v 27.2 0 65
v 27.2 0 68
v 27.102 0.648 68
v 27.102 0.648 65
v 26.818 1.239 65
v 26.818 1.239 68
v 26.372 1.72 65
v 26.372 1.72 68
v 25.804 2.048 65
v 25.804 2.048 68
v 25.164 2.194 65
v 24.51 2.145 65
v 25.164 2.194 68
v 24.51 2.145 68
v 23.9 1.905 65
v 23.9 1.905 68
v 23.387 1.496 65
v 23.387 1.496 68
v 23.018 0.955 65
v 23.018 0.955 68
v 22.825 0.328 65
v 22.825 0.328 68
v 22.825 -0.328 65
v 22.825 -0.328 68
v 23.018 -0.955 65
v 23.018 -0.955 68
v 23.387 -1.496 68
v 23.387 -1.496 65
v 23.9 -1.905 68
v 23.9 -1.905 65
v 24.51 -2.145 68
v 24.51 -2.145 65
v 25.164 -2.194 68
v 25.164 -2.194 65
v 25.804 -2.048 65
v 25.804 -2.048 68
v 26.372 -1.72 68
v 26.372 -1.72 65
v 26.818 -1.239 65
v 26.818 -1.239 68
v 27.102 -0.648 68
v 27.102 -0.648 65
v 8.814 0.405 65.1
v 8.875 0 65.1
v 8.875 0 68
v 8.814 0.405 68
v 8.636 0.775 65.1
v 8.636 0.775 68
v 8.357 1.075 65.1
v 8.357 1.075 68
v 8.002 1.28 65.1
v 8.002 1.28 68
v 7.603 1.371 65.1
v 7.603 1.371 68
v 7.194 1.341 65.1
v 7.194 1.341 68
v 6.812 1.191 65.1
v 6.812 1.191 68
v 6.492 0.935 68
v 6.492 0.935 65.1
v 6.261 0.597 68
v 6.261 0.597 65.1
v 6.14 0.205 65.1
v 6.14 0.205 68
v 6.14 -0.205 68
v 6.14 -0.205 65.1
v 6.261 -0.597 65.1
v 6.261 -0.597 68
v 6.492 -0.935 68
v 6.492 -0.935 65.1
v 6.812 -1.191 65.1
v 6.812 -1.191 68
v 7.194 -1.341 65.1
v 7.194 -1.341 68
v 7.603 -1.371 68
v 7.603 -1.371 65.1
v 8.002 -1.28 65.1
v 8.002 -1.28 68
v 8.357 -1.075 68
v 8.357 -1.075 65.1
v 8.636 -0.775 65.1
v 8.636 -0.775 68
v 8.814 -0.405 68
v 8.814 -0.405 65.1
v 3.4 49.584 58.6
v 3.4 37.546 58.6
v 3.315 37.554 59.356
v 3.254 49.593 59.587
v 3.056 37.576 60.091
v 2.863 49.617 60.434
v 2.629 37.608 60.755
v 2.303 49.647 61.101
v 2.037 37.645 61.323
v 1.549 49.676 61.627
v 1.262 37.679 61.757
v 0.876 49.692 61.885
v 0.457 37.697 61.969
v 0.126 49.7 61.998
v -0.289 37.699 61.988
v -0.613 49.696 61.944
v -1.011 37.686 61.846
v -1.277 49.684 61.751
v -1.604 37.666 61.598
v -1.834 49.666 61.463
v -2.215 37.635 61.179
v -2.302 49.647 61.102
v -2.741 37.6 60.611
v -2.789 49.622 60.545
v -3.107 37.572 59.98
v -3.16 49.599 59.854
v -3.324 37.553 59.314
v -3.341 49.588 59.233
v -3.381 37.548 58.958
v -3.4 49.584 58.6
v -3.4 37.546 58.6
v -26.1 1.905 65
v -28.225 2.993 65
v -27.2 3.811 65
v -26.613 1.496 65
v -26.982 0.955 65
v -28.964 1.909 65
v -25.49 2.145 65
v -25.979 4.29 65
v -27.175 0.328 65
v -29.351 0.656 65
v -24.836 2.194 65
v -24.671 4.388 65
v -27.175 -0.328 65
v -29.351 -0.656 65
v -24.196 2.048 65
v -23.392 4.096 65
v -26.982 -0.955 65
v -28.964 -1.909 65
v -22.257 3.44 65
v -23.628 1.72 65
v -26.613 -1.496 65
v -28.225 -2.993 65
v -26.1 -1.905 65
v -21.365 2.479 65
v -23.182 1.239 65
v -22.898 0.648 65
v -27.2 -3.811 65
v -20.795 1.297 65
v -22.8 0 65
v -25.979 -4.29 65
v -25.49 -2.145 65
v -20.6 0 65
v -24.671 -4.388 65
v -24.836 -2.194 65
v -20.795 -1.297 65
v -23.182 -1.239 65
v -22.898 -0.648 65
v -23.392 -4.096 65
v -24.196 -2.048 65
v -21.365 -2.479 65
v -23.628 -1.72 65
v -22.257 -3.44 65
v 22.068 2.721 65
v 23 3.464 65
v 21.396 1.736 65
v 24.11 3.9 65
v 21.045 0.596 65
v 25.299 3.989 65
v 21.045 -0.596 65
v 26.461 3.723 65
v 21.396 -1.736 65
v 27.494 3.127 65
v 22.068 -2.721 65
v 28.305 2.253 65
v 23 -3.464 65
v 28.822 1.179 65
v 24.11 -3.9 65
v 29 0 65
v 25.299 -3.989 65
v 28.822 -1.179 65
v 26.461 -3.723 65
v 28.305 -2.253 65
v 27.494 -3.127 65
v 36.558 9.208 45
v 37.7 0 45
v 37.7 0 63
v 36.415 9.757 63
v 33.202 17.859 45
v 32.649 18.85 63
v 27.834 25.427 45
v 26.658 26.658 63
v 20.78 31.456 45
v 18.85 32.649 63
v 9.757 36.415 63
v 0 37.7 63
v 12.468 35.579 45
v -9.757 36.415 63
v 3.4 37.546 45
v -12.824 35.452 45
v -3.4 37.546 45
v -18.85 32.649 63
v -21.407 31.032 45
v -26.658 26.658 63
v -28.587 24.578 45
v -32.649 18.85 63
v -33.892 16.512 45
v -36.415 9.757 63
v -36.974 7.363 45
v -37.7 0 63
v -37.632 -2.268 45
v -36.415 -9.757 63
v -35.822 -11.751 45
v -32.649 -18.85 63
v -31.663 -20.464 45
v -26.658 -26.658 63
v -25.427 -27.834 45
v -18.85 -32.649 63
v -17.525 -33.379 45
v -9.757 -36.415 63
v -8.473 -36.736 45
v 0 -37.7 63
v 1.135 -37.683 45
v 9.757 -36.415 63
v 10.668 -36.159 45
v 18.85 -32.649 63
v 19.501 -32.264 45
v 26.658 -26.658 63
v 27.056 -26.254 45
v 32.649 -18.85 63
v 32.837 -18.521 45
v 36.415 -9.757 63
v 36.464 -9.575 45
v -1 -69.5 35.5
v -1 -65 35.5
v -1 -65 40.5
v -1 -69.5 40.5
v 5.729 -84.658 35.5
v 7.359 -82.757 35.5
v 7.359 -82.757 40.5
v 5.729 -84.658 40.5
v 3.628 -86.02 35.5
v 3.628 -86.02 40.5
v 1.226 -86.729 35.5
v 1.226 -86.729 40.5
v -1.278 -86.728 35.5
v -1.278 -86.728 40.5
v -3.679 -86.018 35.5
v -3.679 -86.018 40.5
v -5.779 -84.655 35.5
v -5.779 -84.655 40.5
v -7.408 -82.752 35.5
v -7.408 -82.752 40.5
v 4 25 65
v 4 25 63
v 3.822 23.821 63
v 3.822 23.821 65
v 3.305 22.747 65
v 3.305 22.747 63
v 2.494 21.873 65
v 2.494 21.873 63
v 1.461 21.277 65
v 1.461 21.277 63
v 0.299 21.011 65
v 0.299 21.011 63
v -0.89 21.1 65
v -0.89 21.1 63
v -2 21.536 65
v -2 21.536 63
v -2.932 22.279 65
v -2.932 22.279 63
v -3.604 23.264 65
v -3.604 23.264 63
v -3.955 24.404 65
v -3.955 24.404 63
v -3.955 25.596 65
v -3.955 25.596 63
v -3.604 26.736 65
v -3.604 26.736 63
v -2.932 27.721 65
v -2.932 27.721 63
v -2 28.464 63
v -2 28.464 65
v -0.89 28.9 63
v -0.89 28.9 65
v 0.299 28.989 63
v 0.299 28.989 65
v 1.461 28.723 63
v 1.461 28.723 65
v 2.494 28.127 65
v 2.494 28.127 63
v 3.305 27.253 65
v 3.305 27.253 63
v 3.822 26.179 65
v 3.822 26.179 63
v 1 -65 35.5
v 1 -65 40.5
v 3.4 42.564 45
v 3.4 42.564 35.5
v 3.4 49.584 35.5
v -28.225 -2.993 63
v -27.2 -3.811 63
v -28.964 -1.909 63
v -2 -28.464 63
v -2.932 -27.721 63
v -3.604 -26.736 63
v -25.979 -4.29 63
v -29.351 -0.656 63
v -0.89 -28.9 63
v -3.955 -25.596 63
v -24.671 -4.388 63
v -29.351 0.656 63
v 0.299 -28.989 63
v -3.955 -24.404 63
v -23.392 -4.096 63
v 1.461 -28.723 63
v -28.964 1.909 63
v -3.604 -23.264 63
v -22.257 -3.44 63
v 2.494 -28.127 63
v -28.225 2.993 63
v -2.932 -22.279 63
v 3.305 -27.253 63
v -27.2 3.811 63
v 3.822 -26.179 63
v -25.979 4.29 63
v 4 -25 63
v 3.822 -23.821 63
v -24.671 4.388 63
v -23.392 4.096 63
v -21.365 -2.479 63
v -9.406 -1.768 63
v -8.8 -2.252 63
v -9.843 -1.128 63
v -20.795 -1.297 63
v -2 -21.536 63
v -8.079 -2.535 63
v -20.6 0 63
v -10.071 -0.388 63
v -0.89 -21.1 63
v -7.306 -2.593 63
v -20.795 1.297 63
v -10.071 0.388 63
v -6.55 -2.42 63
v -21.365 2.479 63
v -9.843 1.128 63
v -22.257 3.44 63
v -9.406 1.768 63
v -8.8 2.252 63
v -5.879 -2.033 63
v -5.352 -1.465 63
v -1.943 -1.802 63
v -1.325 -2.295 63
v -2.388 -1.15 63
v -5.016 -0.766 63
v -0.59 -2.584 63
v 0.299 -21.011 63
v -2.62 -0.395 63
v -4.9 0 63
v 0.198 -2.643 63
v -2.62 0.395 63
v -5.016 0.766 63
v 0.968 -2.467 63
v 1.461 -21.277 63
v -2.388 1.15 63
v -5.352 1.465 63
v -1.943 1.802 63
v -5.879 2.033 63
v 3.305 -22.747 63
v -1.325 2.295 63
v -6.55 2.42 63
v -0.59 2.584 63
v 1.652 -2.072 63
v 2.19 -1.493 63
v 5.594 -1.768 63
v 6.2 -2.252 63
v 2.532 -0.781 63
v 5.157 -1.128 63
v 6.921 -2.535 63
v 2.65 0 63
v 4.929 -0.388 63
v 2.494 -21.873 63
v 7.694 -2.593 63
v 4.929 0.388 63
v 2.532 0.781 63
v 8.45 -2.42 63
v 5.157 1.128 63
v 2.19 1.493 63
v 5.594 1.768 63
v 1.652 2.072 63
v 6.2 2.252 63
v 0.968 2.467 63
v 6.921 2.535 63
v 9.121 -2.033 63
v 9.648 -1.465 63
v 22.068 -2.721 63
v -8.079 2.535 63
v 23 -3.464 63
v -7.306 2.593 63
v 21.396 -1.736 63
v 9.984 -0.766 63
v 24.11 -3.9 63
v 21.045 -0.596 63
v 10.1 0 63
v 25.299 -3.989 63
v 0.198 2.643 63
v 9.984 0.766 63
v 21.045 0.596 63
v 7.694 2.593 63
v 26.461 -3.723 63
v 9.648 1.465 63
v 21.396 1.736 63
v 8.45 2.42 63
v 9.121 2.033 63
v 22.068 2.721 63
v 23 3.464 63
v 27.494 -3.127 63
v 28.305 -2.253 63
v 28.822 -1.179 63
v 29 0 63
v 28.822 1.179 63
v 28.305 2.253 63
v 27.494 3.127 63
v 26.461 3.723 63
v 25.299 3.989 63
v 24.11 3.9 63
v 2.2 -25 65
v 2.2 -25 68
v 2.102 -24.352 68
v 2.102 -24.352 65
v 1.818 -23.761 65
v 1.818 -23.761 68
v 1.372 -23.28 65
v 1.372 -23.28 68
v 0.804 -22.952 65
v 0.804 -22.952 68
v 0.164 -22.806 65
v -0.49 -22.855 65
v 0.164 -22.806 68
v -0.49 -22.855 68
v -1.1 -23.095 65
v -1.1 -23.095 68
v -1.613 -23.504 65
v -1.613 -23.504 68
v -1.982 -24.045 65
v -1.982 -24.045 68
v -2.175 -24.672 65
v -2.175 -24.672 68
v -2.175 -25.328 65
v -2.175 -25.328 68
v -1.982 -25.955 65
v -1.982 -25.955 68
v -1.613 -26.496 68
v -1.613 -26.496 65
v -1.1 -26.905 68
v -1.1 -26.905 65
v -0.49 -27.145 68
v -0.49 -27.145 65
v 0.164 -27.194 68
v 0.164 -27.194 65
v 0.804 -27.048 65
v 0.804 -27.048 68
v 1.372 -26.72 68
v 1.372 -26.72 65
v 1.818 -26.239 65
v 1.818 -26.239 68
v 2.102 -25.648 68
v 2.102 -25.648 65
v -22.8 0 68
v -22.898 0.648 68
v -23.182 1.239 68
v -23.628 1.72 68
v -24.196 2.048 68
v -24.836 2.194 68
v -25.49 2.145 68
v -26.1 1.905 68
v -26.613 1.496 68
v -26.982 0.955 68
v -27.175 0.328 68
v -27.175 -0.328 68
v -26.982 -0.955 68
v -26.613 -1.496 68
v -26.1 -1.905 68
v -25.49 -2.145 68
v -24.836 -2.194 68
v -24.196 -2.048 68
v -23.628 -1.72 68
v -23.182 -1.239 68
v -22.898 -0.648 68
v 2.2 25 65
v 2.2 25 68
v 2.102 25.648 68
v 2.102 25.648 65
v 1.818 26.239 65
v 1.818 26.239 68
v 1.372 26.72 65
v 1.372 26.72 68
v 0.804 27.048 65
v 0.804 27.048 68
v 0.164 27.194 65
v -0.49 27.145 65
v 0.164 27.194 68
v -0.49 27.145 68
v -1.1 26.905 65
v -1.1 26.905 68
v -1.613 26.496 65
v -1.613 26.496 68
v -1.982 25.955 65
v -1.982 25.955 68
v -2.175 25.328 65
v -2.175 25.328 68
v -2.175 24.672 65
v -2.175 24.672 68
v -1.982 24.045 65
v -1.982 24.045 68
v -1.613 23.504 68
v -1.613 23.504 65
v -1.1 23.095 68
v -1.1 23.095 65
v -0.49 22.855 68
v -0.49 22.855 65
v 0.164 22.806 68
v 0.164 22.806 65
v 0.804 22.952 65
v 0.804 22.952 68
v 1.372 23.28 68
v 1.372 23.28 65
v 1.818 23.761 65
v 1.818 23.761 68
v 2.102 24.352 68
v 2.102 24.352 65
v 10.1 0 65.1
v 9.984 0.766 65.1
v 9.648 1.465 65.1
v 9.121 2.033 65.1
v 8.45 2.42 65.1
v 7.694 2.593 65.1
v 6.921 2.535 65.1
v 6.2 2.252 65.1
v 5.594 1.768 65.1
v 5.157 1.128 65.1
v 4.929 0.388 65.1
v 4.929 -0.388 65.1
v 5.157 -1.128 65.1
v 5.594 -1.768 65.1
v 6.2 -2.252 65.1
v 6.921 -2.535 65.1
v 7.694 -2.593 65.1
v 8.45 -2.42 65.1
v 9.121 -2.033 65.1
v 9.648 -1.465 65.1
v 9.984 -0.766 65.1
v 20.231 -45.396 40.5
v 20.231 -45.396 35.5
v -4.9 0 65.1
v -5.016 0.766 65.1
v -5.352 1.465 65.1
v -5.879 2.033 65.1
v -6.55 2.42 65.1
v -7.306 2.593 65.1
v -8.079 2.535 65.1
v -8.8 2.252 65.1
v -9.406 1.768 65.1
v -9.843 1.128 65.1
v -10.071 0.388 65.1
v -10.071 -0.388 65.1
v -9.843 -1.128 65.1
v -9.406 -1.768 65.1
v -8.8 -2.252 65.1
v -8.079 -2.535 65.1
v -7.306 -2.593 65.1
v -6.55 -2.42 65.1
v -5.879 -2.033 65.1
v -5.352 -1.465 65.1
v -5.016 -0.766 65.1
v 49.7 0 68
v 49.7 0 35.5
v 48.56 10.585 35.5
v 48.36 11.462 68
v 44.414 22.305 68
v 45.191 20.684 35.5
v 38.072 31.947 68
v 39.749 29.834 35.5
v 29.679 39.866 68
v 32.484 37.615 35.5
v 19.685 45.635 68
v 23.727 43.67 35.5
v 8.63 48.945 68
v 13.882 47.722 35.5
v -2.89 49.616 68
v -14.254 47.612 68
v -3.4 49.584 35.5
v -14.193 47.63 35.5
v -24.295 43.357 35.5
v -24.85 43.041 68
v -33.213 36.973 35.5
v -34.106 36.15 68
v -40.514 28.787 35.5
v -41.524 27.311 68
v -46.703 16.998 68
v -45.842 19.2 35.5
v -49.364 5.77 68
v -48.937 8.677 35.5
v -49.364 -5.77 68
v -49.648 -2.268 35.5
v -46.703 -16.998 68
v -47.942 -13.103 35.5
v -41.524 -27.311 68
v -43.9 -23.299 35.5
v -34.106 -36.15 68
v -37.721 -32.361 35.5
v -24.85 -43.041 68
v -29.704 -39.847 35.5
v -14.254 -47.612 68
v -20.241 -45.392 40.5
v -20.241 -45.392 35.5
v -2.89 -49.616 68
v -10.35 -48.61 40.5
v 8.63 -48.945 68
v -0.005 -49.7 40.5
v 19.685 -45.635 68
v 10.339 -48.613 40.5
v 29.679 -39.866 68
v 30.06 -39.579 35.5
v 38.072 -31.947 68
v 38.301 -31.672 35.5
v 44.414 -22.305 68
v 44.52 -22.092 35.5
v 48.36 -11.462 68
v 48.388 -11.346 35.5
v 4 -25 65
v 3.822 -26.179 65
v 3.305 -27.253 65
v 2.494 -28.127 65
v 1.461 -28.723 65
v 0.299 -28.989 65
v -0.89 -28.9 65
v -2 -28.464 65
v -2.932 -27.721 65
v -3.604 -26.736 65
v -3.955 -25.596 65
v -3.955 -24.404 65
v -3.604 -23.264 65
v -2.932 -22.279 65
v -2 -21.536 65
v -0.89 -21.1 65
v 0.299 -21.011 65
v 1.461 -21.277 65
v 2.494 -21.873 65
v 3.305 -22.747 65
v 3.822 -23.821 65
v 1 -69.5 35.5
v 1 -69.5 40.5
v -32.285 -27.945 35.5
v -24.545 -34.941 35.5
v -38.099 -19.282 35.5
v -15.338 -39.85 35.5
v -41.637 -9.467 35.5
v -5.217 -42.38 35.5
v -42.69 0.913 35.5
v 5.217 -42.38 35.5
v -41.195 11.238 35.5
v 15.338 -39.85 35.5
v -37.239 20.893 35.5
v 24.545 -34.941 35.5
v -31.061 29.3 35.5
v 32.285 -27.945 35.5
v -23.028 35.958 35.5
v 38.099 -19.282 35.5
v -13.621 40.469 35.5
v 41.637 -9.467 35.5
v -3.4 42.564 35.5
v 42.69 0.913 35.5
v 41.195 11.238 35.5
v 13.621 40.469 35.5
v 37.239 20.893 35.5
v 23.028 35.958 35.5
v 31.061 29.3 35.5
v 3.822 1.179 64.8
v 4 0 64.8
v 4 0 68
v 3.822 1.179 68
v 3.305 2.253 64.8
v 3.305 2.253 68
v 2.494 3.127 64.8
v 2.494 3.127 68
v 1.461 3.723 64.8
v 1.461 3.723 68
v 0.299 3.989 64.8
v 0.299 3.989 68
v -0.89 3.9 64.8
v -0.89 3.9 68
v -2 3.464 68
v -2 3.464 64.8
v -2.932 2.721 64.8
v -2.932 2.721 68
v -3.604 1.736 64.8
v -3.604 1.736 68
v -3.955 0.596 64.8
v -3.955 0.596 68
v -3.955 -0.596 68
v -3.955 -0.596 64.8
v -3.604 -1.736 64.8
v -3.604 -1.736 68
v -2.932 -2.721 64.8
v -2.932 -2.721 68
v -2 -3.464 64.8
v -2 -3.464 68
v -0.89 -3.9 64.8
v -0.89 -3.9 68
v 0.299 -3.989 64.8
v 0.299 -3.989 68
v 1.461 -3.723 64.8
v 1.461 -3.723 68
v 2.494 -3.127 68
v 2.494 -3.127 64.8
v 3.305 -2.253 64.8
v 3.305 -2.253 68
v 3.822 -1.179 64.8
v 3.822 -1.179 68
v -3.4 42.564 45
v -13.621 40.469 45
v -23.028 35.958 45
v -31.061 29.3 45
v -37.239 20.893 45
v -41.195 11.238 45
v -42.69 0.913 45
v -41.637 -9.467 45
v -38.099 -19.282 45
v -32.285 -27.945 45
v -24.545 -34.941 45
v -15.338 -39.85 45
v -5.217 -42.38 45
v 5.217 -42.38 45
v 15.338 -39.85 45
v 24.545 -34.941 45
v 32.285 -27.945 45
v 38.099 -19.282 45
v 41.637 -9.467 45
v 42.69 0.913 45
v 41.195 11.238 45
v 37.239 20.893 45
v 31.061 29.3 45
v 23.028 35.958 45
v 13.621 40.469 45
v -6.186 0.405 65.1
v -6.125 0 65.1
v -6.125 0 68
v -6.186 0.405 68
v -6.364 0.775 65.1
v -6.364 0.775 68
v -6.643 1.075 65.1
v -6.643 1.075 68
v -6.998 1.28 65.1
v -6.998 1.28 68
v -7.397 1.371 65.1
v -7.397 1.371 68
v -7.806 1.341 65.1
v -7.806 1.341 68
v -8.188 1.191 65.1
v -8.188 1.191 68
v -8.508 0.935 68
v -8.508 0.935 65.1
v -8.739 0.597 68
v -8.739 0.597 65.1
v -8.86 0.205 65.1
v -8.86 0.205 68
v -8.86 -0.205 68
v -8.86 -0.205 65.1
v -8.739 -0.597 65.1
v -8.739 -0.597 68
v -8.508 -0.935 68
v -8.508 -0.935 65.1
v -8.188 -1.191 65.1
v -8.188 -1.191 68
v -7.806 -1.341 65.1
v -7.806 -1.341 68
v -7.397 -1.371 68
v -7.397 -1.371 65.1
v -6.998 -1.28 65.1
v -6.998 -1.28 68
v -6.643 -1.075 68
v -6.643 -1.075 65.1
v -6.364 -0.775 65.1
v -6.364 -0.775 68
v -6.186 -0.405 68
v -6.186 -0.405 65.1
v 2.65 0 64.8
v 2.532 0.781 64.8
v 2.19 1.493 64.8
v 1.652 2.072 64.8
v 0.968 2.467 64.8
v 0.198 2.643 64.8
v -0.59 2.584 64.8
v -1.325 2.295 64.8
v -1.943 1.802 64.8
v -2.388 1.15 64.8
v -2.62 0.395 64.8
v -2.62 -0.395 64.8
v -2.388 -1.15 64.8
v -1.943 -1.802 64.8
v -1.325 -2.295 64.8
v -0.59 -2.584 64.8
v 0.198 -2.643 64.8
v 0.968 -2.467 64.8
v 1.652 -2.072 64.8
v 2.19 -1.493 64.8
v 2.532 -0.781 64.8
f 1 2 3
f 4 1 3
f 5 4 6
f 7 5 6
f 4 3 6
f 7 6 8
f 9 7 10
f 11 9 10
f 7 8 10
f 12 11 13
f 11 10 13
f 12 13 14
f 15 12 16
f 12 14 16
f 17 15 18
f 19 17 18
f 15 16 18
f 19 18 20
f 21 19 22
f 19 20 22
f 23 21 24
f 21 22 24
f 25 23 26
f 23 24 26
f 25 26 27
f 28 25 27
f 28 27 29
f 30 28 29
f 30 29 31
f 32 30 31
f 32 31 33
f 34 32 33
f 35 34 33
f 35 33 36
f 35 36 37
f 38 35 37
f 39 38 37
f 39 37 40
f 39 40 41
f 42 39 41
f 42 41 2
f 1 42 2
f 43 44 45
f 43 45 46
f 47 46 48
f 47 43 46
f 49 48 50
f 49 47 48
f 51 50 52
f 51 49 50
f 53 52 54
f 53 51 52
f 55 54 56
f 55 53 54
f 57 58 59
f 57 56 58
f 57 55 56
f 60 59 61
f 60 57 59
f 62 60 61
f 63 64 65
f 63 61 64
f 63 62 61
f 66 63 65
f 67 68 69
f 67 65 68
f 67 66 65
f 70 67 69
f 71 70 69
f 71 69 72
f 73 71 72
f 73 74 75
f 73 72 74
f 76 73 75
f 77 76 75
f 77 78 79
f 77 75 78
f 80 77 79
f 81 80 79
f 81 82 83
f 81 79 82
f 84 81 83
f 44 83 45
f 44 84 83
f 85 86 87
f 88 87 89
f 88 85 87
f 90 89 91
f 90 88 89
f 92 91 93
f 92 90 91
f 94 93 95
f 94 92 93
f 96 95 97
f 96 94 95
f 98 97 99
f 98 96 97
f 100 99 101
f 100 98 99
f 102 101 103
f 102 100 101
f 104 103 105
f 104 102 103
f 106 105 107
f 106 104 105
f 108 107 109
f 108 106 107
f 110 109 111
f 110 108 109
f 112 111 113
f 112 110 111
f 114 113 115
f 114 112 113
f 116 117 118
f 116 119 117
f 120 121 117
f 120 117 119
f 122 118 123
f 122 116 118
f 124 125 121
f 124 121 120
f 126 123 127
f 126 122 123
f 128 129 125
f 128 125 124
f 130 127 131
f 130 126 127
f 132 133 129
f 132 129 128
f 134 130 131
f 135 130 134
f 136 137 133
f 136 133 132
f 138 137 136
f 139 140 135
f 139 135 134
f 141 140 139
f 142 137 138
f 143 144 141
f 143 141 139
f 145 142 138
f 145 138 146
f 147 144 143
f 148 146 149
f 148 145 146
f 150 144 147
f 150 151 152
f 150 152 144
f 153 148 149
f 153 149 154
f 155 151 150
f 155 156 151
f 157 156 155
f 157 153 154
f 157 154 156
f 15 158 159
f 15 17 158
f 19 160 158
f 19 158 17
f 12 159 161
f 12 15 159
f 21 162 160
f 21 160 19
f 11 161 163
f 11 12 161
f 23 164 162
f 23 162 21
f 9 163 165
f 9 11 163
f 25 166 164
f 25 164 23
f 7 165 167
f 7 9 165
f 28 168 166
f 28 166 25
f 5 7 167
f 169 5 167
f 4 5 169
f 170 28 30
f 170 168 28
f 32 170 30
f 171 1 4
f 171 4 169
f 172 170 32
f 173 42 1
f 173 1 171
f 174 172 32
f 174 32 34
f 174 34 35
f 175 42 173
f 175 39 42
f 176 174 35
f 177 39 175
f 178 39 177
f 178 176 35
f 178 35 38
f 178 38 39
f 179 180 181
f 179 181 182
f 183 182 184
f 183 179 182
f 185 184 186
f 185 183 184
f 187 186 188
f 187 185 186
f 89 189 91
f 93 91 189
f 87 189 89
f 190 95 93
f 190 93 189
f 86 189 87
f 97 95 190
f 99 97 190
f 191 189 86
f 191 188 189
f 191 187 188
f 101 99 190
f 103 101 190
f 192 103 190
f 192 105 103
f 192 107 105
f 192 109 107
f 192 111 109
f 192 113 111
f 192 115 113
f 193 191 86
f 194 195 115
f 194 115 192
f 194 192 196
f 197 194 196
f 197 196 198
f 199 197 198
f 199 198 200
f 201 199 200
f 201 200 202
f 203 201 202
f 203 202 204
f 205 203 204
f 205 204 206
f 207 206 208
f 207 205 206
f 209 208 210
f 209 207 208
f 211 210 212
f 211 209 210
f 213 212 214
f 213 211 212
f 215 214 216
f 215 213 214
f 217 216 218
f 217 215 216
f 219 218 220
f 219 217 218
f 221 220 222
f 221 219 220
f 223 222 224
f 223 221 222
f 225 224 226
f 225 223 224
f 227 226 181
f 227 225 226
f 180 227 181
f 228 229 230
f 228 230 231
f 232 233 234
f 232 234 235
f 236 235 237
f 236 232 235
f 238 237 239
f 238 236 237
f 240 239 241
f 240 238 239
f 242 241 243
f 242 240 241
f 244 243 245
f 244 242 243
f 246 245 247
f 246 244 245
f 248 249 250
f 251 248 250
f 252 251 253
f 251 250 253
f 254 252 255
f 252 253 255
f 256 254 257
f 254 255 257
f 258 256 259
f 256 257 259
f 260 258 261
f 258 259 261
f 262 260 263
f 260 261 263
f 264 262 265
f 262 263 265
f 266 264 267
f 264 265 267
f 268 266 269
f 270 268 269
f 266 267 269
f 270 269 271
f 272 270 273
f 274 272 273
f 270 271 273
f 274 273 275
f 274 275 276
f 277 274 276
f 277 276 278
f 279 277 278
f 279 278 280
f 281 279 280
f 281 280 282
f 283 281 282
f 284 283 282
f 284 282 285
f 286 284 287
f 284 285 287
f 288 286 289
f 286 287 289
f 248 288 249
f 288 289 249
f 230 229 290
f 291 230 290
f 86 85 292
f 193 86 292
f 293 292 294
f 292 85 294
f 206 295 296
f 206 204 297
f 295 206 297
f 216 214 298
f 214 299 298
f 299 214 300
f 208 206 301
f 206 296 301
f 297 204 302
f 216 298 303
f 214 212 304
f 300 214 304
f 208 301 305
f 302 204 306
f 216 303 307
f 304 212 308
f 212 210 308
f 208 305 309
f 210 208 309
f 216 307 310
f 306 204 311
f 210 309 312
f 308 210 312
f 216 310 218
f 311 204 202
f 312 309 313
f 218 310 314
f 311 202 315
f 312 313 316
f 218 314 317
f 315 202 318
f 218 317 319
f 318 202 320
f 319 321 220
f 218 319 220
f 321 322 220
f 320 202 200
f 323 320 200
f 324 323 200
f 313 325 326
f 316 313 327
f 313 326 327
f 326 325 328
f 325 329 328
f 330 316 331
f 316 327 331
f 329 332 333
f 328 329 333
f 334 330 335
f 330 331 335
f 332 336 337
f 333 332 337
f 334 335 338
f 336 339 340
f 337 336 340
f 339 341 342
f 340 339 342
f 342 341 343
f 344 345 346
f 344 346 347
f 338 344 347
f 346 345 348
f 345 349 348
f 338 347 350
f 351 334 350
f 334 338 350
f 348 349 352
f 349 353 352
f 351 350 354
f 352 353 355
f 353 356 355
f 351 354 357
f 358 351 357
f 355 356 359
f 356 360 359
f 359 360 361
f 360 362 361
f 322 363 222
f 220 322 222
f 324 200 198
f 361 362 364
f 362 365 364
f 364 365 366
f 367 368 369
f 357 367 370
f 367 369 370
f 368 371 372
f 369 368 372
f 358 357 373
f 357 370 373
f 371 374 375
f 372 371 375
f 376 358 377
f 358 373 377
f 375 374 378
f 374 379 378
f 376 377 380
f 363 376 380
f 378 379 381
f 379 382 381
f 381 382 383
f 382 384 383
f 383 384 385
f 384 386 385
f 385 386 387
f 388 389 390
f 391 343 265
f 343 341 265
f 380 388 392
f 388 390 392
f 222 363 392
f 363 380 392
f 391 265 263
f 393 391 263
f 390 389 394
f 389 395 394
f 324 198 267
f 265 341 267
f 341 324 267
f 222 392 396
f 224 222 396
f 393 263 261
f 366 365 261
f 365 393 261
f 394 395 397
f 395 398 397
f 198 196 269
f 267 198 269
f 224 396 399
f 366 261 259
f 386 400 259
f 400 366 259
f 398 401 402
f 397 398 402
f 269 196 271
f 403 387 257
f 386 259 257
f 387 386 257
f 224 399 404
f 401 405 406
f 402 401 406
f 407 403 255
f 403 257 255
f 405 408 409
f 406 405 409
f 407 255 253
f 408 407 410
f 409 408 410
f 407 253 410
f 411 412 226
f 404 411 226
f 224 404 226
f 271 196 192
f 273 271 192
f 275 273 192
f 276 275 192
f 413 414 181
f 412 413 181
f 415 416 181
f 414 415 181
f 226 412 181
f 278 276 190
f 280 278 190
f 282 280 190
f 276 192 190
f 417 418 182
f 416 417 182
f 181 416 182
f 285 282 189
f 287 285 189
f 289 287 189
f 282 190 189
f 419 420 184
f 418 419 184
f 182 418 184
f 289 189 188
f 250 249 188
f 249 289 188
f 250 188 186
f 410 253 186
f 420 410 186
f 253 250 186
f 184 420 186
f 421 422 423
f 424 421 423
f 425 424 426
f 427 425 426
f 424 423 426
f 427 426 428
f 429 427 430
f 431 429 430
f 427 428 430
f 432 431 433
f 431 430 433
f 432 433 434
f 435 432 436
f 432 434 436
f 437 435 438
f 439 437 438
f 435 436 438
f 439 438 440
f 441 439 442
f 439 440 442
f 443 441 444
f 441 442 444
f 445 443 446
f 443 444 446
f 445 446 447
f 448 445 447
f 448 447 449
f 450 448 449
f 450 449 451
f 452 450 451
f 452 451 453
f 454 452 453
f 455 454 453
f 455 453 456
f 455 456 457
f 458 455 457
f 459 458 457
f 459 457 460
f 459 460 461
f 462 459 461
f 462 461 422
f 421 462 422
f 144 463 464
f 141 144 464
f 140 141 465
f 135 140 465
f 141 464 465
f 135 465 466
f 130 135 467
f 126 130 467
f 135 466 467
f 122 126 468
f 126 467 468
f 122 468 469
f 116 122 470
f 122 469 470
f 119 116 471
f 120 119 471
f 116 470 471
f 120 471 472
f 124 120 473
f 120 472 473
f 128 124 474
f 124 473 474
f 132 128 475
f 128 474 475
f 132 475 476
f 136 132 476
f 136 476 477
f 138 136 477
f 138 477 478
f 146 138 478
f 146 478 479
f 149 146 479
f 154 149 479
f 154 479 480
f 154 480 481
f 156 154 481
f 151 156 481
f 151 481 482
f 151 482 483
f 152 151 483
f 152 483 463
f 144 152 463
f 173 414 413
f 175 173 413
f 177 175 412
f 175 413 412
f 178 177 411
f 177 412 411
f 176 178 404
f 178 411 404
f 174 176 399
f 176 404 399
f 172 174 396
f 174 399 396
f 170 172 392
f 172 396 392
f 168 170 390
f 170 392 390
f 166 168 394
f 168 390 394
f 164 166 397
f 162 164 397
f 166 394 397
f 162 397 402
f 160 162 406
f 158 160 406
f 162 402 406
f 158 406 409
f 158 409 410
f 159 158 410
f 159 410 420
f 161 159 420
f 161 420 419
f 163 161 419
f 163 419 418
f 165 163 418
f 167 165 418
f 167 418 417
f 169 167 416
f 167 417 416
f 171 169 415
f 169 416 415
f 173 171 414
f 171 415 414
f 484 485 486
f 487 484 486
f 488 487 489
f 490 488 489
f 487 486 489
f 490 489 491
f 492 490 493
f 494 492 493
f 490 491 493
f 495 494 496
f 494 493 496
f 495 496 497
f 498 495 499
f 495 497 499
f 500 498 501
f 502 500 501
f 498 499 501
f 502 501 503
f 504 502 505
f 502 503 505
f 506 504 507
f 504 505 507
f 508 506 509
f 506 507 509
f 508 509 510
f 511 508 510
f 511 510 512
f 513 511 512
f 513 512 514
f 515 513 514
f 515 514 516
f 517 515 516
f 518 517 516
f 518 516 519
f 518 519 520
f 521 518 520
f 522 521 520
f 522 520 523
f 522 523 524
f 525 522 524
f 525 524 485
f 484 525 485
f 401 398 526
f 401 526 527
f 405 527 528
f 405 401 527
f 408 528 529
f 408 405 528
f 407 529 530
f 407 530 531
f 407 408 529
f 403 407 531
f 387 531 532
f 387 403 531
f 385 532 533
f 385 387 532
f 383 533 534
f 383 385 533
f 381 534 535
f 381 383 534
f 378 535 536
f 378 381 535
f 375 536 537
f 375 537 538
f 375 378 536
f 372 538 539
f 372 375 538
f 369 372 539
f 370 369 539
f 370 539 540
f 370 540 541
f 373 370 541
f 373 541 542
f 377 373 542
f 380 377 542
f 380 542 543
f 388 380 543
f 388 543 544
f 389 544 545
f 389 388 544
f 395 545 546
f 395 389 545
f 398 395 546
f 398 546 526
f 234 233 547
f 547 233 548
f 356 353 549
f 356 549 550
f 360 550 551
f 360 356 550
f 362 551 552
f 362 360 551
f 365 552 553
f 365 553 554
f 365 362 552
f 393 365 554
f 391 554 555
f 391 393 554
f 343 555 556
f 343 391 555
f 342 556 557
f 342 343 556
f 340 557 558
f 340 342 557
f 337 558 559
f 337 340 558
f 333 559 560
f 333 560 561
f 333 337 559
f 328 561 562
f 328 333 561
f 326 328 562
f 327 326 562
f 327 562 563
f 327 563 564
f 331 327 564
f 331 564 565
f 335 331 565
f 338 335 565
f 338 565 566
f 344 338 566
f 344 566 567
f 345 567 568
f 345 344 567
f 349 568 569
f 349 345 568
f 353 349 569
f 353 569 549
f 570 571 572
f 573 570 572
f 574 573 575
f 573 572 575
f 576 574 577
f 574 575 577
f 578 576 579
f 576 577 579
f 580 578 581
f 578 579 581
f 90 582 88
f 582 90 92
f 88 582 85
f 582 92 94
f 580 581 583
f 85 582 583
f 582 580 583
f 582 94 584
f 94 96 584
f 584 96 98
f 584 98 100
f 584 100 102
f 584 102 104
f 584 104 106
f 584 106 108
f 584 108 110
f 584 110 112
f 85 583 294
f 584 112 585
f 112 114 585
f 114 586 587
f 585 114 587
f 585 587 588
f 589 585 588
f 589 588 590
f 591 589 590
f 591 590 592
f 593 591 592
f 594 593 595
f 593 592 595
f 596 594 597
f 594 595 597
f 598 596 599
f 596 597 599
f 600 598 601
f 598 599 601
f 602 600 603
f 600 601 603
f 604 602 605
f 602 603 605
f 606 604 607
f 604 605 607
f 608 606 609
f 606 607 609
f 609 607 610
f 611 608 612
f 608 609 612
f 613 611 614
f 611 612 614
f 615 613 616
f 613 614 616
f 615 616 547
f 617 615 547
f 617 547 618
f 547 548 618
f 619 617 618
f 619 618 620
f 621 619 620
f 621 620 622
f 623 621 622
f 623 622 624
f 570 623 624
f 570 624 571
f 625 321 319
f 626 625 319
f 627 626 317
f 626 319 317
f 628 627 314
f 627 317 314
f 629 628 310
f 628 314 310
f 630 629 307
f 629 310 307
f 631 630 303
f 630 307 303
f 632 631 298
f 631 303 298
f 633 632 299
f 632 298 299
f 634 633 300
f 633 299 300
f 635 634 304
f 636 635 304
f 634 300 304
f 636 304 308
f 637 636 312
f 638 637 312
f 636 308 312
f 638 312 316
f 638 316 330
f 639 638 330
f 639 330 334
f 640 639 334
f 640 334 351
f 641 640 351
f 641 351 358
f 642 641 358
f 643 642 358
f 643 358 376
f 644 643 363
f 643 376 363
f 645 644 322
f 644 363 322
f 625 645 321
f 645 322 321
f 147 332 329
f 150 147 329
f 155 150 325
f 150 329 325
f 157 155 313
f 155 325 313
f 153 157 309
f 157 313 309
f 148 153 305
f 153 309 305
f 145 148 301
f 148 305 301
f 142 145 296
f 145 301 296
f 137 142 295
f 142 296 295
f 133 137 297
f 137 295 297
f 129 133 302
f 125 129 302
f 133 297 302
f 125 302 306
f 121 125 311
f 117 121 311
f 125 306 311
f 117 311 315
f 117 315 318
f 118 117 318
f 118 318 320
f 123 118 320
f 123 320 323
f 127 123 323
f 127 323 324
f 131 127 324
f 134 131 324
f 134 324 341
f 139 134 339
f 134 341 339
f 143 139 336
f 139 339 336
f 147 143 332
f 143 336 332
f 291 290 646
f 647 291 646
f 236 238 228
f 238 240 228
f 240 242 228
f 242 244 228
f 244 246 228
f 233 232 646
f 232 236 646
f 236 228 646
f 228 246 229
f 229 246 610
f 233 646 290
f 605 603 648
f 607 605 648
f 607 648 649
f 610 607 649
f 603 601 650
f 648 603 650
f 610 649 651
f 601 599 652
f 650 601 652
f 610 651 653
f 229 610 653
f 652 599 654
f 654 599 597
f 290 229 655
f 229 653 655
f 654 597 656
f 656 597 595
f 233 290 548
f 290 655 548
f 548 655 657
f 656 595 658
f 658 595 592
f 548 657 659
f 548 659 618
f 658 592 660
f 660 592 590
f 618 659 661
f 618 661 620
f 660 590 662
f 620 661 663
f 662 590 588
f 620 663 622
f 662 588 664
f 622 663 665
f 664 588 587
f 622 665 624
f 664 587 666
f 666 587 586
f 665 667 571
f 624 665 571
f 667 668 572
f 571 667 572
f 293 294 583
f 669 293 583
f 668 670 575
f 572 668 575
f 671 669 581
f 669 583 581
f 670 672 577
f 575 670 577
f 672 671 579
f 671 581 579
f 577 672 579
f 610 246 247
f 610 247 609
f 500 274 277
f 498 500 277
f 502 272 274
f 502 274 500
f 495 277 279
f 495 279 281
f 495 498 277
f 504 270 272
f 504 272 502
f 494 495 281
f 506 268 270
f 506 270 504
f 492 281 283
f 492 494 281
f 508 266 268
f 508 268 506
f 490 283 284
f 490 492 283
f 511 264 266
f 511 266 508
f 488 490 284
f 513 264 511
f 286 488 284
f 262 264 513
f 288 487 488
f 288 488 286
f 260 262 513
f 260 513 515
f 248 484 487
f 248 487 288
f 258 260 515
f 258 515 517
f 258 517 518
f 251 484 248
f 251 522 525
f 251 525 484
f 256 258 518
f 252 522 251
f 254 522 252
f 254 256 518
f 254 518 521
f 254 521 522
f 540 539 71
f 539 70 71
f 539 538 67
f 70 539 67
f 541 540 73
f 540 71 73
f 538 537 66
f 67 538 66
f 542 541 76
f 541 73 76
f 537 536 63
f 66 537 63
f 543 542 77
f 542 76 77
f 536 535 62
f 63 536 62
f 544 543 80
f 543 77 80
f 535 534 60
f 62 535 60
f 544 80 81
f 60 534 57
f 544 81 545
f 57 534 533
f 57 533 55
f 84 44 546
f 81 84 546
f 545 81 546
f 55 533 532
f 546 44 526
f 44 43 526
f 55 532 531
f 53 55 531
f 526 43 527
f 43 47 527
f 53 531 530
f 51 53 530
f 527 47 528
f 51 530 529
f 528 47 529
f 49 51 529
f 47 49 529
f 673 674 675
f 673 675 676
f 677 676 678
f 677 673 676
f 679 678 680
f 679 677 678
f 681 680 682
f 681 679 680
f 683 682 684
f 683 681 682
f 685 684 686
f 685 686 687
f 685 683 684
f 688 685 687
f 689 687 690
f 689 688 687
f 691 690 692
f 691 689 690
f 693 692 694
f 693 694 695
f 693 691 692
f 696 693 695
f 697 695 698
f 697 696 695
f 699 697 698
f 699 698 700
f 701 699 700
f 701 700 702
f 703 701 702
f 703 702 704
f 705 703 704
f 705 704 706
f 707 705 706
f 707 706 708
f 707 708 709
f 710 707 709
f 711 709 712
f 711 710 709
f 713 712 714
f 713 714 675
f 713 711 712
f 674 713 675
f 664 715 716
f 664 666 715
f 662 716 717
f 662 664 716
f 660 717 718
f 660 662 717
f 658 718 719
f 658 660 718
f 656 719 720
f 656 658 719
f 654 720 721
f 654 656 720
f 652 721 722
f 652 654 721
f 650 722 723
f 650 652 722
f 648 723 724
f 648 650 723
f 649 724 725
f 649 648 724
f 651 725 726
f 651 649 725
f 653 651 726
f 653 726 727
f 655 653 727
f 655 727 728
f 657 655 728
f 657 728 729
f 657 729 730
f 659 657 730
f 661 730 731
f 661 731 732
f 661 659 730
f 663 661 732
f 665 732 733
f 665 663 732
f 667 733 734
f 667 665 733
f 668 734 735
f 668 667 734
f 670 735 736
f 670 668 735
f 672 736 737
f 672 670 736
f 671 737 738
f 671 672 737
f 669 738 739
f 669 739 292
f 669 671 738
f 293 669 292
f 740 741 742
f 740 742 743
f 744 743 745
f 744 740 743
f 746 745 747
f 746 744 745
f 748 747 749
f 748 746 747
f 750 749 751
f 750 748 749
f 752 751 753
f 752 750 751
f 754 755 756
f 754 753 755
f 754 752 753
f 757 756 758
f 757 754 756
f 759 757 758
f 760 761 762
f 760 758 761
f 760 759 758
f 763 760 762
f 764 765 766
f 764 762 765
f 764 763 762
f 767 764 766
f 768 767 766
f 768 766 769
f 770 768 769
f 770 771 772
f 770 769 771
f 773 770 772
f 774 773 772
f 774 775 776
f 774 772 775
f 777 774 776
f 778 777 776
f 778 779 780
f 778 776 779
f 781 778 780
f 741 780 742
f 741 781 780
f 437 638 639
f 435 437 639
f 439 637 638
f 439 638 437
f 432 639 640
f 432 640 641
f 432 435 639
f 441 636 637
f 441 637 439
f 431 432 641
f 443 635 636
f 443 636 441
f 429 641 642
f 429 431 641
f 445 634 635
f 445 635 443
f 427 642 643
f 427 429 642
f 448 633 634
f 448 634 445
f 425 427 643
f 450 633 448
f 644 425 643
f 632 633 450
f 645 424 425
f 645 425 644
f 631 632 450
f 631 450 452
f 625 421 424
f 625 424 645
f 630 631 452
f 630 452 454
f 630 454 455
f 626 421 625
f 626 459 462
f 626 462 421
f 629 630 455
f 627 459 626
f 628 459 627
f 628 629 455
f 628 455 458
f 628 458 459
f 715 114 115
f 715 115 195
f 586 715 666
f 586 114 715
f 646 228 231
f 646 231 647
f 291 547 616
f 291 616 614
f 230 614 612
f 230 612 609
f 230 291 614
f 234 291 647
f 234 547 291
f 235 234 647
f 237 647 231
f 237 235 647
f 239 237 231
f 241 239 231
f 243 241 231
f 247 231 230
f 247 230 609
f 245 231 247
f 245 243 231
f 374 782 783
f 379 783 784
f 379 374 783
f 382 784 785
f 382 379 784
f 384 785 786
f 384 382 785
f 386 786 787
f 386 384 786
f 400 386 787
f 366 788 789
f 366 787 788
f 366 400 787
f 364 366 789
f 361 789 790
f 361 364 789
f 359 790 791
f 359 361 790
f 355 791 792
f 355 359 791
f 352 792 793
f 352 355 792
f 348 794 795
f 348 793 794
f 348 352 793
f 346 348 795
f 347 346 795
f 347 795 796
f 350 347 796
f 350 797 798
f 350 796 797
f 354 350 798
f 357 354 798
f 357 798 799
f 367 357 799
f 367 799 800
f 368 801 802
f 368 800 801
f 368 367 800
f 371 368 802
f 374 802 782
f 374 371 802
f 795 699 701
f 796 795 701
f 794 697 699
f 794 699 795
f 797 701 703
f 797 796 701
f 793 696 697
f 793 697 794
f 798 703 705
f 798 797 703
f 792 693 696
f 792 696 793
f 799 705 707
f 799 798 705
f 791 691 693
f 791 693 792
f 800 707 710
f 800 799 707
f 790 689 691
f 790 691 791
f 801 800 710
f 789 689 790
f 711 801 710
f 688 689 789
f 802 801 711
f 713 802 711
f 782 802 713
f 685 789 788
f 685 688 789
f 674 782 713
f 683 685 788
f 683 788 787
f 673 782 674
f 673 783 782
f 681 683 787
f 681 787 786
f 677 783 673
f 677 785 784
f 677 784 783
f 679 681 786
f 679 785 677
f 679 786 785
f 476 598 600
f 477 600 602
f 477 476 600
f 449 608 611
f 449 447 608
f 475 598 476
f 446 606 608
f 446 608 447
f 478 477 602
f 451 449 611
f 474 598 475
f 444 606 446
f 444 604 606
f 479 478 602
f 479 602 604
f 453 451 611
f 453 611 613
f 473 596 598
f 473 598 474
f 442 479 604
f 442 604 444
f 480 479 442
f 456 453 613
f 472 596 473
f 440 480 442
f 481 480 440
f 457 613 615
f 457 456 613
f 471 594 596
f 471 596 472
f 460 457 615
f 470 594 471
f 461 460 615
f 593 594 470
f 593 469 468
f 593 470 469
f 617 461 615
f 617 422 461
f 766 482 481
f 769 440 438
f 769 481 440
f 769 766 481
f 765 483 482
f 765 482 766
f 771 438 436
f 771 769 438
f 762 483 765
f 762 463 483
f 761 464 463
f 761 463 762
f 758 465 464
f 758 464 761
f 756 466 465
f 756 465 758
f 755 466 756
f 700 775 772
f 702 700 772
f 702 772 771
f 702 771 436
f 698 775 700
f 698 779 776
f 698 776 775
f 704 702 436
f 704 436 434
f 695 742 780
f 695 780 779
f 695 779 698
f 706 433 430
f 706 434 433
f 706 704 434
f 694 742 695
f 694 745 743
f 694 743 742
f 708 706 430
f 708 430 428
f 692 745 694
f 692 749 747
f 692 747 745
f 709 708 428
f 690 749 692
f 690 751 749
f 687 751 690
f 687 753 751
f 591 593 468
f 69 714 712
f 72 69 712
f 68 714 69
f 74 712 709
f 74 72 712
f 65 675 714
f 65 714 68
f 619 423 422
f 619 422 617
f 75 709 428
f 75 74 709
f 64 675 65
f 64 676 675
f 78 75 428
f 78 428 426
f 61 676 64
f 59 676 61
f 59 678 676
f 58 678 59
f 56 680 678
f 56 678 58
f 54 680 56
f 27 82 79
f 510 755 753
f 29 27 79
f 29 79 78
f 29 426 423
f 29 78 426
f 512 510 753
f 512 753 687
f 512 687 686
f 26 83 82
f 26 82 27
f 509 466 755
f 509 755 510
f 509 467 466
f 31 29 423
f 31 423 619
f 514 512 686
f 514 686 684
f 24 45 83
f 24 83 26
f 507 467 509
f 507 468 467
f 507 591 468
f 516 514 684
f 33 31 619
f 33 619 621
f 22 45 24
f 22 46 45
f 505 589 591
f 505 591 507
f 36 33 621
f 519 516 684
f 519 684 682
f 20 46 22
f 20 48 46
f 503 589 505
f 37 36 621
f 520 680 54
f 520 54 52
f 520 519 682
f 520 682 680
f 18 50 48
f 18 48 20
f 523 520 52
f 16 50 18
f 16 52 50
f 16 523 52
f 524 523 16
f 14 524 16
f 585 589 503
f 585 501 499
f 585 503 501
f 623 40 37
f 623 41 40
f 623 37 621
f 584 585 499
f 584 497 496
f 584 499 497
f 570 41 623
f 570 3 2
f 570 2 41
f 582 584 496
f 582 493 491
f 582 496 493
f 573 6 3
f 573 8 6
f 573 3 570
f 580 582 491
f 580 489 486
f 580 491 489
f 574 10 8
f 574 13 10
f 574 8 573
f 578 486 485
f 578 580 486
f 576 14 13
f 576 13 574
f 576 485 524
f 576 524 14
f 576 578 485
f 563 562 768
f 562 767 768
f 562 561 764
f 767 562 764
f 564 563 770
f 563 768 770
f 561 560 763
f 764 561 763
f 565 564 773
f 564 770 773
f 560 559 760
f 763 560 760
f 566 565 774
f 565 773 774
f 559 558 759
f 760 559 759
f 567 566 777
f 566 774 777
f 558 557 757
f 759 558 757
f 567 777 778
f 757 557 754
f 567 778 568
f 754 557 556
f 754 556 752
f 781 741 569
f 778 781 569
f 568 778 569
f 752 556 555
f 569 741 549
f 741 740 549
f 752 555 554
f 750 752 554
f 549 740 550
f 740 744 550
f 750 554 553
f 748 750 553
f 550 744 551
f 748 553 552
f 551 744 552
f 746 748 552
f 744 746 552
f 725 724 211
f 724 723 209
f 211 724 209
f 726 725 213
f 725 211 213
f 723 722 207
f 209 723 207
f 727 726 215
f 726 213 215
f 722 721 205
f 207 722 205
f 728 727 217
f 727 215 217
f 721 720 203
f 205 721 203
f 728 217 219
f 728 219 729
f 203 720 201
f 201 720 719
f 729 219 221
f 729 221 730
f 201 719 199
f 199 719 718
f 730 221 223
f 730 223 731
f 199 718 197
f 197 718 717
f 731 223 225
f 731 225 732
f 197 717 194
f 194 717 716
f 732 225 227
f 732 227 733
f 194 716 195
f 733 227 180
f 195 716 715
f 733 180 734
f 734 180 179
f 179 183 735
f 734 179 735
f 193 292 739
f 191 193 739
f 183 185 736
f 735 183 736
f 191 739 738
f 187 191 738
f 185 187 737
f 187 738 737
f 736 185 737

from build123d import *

# Parameters (mm, degrees)
CYLINDER009_R     = 2.65
CYLINDER009_DEPTH = 30
CYLINDER008_R     = 4
CYLINDER008_DEPTH = 3.2
CYLINDER010_R     = 1.375
CYLINDER010_DEPTH = 10
CYLINDER011_R     = 2.6
CYLINDER011_DEPTH = 2.1
ARRAY002_X_COUNT  = 2
ARRAY002_X_PITCH  = 15
CYLINDER007_R     = 37.7
CYLINDER007_DEPTH = 63
CYLINDER013_R     = 42.7
CYLINDER013_DEPTH = 45
CYLINDER012_R     = 49.7
CYLINDER012_DEPTH = 32.5
SKETCH_R          = 2.2
POCKET_DEPTH      = 5
SKETCH001_R       = 4.4
SKETCH001_R_2     = 4
POCKET001_DEPTH   = 2
POCKET006_DEPTH   = 25
PAD002_DEPTH      = 5
SKETCH018_W       = 2
SKETCH018_H       = 4.5
POCKET016_DEPTH   = 5


with BuildPart() as cylinder009:
    # Cylinder009 → Cylinder009 (new body)
    with BuildSketch(Plane.XY.offset(63)):
        Circle(CYLINDER009_R)
    extrude(amount=CYLINDER009_DEPTH)


with BuildPart() as cylinder008:
    # Cylinder008 → Cylinder008 (new body)
    with BuildSketch(Plane.XY.offset(64.8)):
        Circle(CYLINDER008_R)
    extrude(amount=CYLINDER008_DEPTH)


with BuildPart() as cylinder010:
    # Cylinder010 → Cylinder010 (new body)
    with BuildSketch(Plane.XY):
        Circle(CYLINDER010_R)
    extrude(amount=CYLINDER010_DEPTH)


with BuildPart() as fusion005:
    # Cylinder011 → Cylinder011 (new body)
    with BuildSketch(Plane.XY):
        Circle(CYLINDER011_R)
    extrude(amount=CYLINDER011_DEPTH)

    # Fusion004: union Cylinder010
    add(cylinder010.part)


with BuildPart() as fusion005_1:
    # Fusion004 placement: moved
    add(fusion005.part.moved(Location((0, 0, 63))))

    # Array002 X: Fusion005 ×2


with BuildPart() as fusion005_2:
    add(fusion005_1.part)
    with Locations(*[(i * ARRAY002_X_PITCH, 0, 0) for i in range(1, ARRAY002_X_COUNT)]):
        add(fusion005_1.part)


with BuildPart() as fusion005_3:
    # Array002 placement: moved
    add(fusion005_2.part.moved(Location((-7.5, 0, 0))))

    # Fusion005: union Cylinder009, Cylinder008
    add(cylinder009.part)
    add(cylinder008.part)


with BuildPart() as cylinder007:
    # Cylinder007 → Cylinder007 (new body)
    with BuildSketch(Plane.XY):
        Circle(CYLINDER007_R)
    extrude(amount=CYLINDER007_DEPTH)


with BuildPart() as fusion006:
    # Cylinder013 → Cylinder013 (new body)
    with BuildSketch(Plane.XY):
        Circle(CYLINDER013_R)
    extrude(amount=CYLINDER013_DEPTH)

    # Fusion006: union Cylinder007
    add(cylinder007.part)


with BuildPart() as mounttocase:
    # Cylinder012 → Cylinder012 (new body)
    with BuildSketch(Plane.XY.offset(35.5)):
        Circle(CYLINDER012_R)
    extrude(amount=CYLINDER012_DEPTH)

    # Cut008: cut Fusion006
    add(fusion006.part, mode=Mode.SUBTRACT)

    # Cut009: cut Fusion005
    add(fusion005_3.part, mode=Mode.SUBTRACT)

    # Sketch (on Face3 of Cut009) → Pocket (cut)
    with BuildSketch(Plane.XY.offset(68)):
        with Locations((0, 25)):
            Circle(SKETCH_R)
        with Locations((25, 0)):
            Circle(SKETCH_R)
        with Locations((0, -25)):
            Circle(SKETCH_R)
        with Locations((-25, 0)):
            Circle(SKETCH_R)
    extrude(amount=-POCKET_DEPTH, mode=Mode.SUBTRACT)

    # Sketch001 (on Face13 of Pocket) → Pocket001 (cut)
    with BuildSketch(Plane(origin=(0, 0, 63), x_dir=(1, 0, 0), z_dir=(0, 0, -1))):
        with Locations((-25, 0)):
            Circle(SKETCH001_R)
        with Locations((0, 25)):
            Circle(SKETCH001_R_2)
        with Locations((25, 0)):
            Circle(SKETCH001_R_2)
        with Locations((0, -25)):
            Circle(SKETCH001_R_2)
    extrude(amount=-POCKET001_DEPTH, mode=Mode.SUBTRACT)

    # Sketch002 → Pocket006 (cut)
    with BuildSketch(Plane(origin=(0, 60, -1), x_dir=(1, 0, 0), z_dir=(0, -1, 0))):
        with BuildLine():
            ThreePointArc((3.4, 59.599979), (1.2e-05, 63), (-3.4, 59.600003))
            Line((-3.4, 59.600003), (-3.4, 0))
            Line((-3.4, 0), (3.4, 0))
            Line((3.4, 59.599979), (3.4, 0))
        make_face()
    extrude(amount=POCKET006_DEPTH, mode=Mode.SUBTRACT)

    # Sketch017 (on Face2 of Pocket006) → Pad002 (join)
    with BuildSketch(Plane(origin=(0, 0, 35.5), x_dir=(1, 0, 0), z_dir=(0, 0, -1))):
        with BuildLine():
            ThreePointArc((20.231067, 45.395694), (-0.005277, 49.699749), (-20.240706, 45.391396))
            Line((-7.40759, 82.752427), (-20.240706, 45.391396))
            ThreePointArc((7.358623, 82.756756), (-0.025675, 86.818946), (-7.40759, 82.752427))
            Line((7.358623, 82.756756), (20.231067, 45.395694))
        make_face()
    extrude(amount=-PAD002_DEPTH)

    # Sketch018 (on Face22 of Pad002) → Pocket016 (cut)
    with BuildSketch(Plane(origin=(0, 0, 35.5), x_dir=(1, 0, 0), z_dir=(0, 0, -1))):
        with Locations((0, 67.25)):
            Rectangle(SKETCH018_W, SKETCH018_H)
    extrude(amount=-POCKET016_DEPTH, mode=Mode.SUBTRACT)


solid = mounttocase.part
